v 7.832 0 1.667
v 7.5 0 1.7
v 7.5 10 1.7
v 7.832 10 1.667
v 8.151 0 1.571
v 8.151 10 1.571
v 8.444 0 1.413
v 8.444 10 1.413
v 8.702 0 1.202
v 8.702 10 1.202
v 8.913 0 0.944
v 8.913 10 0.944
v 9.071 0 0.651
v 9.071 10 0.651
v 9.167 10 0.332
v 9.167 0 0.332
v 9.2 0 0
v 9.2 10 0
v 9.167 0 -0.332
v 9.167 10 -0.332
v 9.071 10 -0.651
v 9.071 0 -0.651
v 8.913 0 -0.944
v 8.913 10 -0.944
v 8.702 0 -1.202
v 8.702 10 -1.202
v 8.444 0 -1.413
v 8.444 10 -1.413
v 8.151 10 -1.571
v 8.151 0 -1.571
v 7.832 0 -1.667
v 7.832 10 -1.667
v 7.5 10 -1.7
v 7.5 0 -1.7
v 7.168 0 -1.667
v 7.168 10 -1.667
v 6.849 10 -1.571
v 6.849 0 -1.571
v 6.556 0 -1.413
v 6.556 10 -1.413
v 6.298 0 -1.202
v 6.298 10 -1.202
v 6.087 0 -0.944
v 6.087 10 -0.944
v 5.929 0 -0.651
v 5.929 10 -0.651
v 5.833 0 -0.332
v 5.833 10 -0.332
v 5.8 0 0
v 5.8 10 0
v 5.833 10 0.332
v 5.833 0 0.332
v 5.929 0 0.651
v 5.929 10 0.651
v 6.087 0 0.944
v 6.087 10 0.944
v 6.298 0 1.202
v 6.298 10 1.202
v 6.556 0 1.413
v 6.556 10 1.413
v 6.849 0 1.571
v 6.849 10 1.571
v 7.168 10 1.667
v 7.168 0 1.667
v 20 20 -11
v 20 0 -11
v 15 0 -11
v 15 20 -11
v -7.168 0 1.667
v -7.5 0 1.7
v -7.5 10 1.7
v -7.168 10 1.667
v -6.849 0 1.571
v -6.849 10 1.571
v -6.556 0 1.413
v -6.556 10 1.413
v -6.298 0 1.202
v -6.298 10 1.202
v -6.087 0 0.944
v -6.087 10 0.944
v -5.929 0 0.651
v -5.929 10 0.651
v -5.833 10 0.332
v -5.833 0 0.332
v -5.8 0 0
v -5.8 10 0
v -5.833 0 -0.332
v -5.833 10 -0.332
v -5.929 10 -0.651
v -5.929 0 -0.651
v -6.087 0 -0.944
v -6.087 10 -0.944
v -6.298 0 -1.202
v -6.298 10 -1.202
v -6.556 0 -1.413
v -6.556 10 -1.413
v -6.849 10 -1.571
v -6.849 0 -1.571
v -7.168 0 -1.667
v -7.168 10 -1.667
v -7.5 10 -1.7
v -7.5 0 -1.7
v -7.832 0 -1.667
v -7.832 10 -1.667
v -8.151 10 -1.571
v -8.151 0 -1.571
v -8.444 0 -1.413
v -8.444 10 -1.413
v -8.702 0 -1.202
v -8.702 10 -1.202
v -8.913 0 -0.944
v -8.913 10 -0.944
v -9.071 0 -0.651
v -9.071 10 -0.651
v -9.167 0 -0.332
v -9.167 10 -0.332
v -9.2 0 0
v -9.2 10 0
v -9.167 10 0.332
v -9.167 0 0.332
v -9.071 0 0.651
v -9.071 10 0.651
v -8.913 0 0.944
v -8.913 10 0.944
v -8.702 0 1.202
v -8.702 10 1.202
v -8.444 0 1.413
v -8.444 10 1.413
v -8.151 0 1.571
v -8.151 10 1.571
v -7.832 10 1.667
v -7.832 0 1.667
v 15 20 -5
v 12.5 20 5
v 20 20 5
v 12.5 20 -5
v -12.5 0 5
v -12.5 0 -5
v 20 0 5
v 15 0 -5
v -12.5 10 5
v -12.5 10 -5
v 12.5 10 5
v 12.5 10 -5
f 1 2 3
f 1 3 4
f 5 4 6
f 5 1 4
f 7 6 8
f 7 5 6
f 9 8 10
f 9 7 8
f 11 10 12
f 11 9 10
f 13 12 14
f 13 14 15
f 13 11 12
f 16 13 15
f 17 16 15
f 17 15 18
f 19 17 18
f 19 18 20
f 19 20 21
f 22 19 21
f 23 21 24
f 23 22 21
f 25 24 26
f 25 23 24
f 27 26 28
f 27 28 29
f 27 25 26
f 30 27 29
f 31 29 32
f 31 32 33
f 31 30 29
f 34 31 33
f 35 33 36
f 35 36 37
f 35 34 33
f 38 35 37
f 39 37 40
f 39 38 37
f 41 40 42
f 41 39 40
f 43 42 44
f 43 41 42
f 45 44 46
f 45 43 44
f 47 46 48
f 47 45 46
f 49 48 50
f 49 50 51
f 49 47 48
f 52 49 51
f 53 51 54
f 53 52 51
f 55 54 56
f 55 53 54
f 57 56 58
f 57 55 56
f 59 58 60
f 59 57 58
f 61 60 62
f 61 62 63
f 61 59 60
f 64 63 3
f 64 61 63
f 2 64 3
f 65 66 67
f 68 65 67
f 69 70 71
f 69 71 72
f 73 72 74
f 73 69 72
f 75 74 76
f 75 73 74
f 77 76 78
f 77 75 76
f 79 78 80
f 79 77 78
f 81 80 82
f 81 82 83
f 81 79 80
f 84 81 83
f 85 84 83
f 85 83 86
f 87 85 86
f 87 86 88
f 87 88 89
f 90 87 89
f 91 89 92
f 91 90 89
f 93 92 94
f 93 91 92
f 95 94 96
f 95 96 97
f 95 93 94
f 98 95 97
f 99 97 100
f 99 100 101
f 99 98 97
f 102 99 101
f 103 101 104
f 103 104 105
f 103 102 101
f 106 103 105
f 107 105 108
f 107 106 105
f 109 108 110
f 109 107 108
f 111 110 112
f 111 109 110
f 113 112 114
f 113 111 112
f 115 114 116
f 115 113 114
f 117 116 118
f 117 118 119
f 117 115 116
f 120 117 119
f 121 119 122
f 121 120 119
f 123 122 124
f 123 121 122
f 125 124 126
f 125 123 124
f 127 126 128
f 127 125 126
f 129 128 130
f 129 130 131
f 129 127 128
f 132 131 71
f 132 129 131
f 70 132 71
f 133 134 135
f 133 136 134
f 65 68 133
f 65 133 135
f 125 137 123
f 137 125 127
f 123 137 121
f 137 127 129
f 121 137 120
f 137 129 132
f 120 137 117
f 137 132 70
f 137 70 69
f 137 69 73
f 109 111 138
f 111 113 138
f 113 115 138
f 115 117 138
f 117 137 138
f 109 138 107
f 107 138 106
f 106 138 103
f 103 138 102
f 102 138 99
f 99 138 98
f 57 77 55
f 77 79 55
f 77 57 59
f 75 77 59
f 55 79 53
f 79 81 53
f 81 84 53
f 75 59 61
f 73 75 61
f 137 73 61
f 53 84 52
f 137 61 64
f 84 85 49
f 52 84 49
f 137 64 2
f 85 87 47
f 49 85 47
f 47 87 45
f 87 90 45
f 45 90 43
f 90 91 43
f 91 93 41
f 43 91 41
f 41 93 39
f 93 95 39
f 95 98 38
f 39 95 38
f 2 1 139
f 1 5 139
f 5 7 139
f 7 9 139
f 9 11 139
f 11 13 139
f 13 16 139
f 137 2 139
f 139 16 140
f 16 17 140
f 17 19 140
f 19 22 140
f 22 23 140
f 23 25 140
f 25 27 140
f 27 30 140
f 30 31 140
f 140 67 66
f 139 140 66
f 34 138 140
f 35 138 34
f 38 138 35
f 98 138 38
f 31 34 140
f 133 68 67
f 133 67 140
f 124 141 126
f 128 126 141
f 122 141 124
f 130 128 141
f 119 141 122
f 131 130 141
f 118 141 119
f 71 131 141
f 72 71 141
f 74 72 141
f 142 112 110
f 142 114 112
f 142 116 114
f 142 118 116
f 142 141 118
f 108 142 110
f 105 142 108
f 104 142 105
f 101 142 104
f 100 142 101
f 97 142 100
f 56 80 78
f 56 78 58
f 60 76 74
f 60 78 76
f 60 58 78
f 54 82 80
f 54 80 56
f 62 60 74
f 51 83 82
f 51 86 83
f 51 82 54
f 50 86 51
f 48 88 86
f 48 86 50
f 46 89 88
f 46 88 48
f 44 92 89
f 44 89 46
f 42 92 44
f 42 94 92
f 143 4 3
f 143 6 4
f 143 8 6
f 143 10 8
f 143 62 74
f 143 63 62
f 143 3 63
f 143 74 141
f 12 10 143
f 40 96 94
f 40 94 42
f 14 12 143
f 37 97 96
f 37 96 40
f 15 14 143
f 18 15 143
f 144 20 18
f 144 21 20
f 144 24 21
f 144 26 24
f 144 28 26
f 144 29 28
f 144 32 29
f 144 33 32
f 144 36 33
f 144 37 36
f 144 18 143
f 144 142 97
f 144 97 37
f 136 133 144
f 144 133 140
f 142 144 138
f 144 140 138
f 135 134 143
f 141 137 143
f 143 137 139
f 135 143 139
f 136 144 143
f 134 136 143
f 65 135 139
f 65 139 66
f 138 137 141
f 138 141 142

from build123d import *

# Parameters (mm, degrees)
SKETCH1_W           = 25
SKETCH1_H           = 10
SKETCH1_R           = 1.7
BOSS_EXTRUDE1_DEPTH = 10
BOSS_EXTRUDE2_DEPTH = 20


with BuildPart() as part:
    # Sketch1 → Boss-Extrude1 (new body)
    with BuildSketch(Plane(origin=(0, 0, 0), x_dir=(1, 0, 0), z_dir=(0, 1, 0))):
        Rectangle(SKETCH1_W, SKETCH1_H)
        with Locations(Location((-7.5, 0, 0), (0, 0, 270))):
            Circle(SKETCH1_R, mode=Mode.SUBTRACT)
        with Locations(Location((7.5, 0, 0), (0, 0, 270))):
            Circle(SKETCH1_R, mode=Mode.SUBTRACT)
    extrude(amount=BOSS_EXTRUDE1_DEPTH)

    # Sketch2 → Boss-Extrude2 (add)
    with BuildSketch(Plane(origin=(0, 0, 0), x_dir=(1, 0, 0), z_dir=(0, 1, 0))):
        Polygon((12.5, -5), (20, -5), (20, 11), (15, 11), (15, 5), (12.5, 5), align=None)
    extrude(amount=BOSS_EXTRUDE2_DEPTH)


solid = part.part
